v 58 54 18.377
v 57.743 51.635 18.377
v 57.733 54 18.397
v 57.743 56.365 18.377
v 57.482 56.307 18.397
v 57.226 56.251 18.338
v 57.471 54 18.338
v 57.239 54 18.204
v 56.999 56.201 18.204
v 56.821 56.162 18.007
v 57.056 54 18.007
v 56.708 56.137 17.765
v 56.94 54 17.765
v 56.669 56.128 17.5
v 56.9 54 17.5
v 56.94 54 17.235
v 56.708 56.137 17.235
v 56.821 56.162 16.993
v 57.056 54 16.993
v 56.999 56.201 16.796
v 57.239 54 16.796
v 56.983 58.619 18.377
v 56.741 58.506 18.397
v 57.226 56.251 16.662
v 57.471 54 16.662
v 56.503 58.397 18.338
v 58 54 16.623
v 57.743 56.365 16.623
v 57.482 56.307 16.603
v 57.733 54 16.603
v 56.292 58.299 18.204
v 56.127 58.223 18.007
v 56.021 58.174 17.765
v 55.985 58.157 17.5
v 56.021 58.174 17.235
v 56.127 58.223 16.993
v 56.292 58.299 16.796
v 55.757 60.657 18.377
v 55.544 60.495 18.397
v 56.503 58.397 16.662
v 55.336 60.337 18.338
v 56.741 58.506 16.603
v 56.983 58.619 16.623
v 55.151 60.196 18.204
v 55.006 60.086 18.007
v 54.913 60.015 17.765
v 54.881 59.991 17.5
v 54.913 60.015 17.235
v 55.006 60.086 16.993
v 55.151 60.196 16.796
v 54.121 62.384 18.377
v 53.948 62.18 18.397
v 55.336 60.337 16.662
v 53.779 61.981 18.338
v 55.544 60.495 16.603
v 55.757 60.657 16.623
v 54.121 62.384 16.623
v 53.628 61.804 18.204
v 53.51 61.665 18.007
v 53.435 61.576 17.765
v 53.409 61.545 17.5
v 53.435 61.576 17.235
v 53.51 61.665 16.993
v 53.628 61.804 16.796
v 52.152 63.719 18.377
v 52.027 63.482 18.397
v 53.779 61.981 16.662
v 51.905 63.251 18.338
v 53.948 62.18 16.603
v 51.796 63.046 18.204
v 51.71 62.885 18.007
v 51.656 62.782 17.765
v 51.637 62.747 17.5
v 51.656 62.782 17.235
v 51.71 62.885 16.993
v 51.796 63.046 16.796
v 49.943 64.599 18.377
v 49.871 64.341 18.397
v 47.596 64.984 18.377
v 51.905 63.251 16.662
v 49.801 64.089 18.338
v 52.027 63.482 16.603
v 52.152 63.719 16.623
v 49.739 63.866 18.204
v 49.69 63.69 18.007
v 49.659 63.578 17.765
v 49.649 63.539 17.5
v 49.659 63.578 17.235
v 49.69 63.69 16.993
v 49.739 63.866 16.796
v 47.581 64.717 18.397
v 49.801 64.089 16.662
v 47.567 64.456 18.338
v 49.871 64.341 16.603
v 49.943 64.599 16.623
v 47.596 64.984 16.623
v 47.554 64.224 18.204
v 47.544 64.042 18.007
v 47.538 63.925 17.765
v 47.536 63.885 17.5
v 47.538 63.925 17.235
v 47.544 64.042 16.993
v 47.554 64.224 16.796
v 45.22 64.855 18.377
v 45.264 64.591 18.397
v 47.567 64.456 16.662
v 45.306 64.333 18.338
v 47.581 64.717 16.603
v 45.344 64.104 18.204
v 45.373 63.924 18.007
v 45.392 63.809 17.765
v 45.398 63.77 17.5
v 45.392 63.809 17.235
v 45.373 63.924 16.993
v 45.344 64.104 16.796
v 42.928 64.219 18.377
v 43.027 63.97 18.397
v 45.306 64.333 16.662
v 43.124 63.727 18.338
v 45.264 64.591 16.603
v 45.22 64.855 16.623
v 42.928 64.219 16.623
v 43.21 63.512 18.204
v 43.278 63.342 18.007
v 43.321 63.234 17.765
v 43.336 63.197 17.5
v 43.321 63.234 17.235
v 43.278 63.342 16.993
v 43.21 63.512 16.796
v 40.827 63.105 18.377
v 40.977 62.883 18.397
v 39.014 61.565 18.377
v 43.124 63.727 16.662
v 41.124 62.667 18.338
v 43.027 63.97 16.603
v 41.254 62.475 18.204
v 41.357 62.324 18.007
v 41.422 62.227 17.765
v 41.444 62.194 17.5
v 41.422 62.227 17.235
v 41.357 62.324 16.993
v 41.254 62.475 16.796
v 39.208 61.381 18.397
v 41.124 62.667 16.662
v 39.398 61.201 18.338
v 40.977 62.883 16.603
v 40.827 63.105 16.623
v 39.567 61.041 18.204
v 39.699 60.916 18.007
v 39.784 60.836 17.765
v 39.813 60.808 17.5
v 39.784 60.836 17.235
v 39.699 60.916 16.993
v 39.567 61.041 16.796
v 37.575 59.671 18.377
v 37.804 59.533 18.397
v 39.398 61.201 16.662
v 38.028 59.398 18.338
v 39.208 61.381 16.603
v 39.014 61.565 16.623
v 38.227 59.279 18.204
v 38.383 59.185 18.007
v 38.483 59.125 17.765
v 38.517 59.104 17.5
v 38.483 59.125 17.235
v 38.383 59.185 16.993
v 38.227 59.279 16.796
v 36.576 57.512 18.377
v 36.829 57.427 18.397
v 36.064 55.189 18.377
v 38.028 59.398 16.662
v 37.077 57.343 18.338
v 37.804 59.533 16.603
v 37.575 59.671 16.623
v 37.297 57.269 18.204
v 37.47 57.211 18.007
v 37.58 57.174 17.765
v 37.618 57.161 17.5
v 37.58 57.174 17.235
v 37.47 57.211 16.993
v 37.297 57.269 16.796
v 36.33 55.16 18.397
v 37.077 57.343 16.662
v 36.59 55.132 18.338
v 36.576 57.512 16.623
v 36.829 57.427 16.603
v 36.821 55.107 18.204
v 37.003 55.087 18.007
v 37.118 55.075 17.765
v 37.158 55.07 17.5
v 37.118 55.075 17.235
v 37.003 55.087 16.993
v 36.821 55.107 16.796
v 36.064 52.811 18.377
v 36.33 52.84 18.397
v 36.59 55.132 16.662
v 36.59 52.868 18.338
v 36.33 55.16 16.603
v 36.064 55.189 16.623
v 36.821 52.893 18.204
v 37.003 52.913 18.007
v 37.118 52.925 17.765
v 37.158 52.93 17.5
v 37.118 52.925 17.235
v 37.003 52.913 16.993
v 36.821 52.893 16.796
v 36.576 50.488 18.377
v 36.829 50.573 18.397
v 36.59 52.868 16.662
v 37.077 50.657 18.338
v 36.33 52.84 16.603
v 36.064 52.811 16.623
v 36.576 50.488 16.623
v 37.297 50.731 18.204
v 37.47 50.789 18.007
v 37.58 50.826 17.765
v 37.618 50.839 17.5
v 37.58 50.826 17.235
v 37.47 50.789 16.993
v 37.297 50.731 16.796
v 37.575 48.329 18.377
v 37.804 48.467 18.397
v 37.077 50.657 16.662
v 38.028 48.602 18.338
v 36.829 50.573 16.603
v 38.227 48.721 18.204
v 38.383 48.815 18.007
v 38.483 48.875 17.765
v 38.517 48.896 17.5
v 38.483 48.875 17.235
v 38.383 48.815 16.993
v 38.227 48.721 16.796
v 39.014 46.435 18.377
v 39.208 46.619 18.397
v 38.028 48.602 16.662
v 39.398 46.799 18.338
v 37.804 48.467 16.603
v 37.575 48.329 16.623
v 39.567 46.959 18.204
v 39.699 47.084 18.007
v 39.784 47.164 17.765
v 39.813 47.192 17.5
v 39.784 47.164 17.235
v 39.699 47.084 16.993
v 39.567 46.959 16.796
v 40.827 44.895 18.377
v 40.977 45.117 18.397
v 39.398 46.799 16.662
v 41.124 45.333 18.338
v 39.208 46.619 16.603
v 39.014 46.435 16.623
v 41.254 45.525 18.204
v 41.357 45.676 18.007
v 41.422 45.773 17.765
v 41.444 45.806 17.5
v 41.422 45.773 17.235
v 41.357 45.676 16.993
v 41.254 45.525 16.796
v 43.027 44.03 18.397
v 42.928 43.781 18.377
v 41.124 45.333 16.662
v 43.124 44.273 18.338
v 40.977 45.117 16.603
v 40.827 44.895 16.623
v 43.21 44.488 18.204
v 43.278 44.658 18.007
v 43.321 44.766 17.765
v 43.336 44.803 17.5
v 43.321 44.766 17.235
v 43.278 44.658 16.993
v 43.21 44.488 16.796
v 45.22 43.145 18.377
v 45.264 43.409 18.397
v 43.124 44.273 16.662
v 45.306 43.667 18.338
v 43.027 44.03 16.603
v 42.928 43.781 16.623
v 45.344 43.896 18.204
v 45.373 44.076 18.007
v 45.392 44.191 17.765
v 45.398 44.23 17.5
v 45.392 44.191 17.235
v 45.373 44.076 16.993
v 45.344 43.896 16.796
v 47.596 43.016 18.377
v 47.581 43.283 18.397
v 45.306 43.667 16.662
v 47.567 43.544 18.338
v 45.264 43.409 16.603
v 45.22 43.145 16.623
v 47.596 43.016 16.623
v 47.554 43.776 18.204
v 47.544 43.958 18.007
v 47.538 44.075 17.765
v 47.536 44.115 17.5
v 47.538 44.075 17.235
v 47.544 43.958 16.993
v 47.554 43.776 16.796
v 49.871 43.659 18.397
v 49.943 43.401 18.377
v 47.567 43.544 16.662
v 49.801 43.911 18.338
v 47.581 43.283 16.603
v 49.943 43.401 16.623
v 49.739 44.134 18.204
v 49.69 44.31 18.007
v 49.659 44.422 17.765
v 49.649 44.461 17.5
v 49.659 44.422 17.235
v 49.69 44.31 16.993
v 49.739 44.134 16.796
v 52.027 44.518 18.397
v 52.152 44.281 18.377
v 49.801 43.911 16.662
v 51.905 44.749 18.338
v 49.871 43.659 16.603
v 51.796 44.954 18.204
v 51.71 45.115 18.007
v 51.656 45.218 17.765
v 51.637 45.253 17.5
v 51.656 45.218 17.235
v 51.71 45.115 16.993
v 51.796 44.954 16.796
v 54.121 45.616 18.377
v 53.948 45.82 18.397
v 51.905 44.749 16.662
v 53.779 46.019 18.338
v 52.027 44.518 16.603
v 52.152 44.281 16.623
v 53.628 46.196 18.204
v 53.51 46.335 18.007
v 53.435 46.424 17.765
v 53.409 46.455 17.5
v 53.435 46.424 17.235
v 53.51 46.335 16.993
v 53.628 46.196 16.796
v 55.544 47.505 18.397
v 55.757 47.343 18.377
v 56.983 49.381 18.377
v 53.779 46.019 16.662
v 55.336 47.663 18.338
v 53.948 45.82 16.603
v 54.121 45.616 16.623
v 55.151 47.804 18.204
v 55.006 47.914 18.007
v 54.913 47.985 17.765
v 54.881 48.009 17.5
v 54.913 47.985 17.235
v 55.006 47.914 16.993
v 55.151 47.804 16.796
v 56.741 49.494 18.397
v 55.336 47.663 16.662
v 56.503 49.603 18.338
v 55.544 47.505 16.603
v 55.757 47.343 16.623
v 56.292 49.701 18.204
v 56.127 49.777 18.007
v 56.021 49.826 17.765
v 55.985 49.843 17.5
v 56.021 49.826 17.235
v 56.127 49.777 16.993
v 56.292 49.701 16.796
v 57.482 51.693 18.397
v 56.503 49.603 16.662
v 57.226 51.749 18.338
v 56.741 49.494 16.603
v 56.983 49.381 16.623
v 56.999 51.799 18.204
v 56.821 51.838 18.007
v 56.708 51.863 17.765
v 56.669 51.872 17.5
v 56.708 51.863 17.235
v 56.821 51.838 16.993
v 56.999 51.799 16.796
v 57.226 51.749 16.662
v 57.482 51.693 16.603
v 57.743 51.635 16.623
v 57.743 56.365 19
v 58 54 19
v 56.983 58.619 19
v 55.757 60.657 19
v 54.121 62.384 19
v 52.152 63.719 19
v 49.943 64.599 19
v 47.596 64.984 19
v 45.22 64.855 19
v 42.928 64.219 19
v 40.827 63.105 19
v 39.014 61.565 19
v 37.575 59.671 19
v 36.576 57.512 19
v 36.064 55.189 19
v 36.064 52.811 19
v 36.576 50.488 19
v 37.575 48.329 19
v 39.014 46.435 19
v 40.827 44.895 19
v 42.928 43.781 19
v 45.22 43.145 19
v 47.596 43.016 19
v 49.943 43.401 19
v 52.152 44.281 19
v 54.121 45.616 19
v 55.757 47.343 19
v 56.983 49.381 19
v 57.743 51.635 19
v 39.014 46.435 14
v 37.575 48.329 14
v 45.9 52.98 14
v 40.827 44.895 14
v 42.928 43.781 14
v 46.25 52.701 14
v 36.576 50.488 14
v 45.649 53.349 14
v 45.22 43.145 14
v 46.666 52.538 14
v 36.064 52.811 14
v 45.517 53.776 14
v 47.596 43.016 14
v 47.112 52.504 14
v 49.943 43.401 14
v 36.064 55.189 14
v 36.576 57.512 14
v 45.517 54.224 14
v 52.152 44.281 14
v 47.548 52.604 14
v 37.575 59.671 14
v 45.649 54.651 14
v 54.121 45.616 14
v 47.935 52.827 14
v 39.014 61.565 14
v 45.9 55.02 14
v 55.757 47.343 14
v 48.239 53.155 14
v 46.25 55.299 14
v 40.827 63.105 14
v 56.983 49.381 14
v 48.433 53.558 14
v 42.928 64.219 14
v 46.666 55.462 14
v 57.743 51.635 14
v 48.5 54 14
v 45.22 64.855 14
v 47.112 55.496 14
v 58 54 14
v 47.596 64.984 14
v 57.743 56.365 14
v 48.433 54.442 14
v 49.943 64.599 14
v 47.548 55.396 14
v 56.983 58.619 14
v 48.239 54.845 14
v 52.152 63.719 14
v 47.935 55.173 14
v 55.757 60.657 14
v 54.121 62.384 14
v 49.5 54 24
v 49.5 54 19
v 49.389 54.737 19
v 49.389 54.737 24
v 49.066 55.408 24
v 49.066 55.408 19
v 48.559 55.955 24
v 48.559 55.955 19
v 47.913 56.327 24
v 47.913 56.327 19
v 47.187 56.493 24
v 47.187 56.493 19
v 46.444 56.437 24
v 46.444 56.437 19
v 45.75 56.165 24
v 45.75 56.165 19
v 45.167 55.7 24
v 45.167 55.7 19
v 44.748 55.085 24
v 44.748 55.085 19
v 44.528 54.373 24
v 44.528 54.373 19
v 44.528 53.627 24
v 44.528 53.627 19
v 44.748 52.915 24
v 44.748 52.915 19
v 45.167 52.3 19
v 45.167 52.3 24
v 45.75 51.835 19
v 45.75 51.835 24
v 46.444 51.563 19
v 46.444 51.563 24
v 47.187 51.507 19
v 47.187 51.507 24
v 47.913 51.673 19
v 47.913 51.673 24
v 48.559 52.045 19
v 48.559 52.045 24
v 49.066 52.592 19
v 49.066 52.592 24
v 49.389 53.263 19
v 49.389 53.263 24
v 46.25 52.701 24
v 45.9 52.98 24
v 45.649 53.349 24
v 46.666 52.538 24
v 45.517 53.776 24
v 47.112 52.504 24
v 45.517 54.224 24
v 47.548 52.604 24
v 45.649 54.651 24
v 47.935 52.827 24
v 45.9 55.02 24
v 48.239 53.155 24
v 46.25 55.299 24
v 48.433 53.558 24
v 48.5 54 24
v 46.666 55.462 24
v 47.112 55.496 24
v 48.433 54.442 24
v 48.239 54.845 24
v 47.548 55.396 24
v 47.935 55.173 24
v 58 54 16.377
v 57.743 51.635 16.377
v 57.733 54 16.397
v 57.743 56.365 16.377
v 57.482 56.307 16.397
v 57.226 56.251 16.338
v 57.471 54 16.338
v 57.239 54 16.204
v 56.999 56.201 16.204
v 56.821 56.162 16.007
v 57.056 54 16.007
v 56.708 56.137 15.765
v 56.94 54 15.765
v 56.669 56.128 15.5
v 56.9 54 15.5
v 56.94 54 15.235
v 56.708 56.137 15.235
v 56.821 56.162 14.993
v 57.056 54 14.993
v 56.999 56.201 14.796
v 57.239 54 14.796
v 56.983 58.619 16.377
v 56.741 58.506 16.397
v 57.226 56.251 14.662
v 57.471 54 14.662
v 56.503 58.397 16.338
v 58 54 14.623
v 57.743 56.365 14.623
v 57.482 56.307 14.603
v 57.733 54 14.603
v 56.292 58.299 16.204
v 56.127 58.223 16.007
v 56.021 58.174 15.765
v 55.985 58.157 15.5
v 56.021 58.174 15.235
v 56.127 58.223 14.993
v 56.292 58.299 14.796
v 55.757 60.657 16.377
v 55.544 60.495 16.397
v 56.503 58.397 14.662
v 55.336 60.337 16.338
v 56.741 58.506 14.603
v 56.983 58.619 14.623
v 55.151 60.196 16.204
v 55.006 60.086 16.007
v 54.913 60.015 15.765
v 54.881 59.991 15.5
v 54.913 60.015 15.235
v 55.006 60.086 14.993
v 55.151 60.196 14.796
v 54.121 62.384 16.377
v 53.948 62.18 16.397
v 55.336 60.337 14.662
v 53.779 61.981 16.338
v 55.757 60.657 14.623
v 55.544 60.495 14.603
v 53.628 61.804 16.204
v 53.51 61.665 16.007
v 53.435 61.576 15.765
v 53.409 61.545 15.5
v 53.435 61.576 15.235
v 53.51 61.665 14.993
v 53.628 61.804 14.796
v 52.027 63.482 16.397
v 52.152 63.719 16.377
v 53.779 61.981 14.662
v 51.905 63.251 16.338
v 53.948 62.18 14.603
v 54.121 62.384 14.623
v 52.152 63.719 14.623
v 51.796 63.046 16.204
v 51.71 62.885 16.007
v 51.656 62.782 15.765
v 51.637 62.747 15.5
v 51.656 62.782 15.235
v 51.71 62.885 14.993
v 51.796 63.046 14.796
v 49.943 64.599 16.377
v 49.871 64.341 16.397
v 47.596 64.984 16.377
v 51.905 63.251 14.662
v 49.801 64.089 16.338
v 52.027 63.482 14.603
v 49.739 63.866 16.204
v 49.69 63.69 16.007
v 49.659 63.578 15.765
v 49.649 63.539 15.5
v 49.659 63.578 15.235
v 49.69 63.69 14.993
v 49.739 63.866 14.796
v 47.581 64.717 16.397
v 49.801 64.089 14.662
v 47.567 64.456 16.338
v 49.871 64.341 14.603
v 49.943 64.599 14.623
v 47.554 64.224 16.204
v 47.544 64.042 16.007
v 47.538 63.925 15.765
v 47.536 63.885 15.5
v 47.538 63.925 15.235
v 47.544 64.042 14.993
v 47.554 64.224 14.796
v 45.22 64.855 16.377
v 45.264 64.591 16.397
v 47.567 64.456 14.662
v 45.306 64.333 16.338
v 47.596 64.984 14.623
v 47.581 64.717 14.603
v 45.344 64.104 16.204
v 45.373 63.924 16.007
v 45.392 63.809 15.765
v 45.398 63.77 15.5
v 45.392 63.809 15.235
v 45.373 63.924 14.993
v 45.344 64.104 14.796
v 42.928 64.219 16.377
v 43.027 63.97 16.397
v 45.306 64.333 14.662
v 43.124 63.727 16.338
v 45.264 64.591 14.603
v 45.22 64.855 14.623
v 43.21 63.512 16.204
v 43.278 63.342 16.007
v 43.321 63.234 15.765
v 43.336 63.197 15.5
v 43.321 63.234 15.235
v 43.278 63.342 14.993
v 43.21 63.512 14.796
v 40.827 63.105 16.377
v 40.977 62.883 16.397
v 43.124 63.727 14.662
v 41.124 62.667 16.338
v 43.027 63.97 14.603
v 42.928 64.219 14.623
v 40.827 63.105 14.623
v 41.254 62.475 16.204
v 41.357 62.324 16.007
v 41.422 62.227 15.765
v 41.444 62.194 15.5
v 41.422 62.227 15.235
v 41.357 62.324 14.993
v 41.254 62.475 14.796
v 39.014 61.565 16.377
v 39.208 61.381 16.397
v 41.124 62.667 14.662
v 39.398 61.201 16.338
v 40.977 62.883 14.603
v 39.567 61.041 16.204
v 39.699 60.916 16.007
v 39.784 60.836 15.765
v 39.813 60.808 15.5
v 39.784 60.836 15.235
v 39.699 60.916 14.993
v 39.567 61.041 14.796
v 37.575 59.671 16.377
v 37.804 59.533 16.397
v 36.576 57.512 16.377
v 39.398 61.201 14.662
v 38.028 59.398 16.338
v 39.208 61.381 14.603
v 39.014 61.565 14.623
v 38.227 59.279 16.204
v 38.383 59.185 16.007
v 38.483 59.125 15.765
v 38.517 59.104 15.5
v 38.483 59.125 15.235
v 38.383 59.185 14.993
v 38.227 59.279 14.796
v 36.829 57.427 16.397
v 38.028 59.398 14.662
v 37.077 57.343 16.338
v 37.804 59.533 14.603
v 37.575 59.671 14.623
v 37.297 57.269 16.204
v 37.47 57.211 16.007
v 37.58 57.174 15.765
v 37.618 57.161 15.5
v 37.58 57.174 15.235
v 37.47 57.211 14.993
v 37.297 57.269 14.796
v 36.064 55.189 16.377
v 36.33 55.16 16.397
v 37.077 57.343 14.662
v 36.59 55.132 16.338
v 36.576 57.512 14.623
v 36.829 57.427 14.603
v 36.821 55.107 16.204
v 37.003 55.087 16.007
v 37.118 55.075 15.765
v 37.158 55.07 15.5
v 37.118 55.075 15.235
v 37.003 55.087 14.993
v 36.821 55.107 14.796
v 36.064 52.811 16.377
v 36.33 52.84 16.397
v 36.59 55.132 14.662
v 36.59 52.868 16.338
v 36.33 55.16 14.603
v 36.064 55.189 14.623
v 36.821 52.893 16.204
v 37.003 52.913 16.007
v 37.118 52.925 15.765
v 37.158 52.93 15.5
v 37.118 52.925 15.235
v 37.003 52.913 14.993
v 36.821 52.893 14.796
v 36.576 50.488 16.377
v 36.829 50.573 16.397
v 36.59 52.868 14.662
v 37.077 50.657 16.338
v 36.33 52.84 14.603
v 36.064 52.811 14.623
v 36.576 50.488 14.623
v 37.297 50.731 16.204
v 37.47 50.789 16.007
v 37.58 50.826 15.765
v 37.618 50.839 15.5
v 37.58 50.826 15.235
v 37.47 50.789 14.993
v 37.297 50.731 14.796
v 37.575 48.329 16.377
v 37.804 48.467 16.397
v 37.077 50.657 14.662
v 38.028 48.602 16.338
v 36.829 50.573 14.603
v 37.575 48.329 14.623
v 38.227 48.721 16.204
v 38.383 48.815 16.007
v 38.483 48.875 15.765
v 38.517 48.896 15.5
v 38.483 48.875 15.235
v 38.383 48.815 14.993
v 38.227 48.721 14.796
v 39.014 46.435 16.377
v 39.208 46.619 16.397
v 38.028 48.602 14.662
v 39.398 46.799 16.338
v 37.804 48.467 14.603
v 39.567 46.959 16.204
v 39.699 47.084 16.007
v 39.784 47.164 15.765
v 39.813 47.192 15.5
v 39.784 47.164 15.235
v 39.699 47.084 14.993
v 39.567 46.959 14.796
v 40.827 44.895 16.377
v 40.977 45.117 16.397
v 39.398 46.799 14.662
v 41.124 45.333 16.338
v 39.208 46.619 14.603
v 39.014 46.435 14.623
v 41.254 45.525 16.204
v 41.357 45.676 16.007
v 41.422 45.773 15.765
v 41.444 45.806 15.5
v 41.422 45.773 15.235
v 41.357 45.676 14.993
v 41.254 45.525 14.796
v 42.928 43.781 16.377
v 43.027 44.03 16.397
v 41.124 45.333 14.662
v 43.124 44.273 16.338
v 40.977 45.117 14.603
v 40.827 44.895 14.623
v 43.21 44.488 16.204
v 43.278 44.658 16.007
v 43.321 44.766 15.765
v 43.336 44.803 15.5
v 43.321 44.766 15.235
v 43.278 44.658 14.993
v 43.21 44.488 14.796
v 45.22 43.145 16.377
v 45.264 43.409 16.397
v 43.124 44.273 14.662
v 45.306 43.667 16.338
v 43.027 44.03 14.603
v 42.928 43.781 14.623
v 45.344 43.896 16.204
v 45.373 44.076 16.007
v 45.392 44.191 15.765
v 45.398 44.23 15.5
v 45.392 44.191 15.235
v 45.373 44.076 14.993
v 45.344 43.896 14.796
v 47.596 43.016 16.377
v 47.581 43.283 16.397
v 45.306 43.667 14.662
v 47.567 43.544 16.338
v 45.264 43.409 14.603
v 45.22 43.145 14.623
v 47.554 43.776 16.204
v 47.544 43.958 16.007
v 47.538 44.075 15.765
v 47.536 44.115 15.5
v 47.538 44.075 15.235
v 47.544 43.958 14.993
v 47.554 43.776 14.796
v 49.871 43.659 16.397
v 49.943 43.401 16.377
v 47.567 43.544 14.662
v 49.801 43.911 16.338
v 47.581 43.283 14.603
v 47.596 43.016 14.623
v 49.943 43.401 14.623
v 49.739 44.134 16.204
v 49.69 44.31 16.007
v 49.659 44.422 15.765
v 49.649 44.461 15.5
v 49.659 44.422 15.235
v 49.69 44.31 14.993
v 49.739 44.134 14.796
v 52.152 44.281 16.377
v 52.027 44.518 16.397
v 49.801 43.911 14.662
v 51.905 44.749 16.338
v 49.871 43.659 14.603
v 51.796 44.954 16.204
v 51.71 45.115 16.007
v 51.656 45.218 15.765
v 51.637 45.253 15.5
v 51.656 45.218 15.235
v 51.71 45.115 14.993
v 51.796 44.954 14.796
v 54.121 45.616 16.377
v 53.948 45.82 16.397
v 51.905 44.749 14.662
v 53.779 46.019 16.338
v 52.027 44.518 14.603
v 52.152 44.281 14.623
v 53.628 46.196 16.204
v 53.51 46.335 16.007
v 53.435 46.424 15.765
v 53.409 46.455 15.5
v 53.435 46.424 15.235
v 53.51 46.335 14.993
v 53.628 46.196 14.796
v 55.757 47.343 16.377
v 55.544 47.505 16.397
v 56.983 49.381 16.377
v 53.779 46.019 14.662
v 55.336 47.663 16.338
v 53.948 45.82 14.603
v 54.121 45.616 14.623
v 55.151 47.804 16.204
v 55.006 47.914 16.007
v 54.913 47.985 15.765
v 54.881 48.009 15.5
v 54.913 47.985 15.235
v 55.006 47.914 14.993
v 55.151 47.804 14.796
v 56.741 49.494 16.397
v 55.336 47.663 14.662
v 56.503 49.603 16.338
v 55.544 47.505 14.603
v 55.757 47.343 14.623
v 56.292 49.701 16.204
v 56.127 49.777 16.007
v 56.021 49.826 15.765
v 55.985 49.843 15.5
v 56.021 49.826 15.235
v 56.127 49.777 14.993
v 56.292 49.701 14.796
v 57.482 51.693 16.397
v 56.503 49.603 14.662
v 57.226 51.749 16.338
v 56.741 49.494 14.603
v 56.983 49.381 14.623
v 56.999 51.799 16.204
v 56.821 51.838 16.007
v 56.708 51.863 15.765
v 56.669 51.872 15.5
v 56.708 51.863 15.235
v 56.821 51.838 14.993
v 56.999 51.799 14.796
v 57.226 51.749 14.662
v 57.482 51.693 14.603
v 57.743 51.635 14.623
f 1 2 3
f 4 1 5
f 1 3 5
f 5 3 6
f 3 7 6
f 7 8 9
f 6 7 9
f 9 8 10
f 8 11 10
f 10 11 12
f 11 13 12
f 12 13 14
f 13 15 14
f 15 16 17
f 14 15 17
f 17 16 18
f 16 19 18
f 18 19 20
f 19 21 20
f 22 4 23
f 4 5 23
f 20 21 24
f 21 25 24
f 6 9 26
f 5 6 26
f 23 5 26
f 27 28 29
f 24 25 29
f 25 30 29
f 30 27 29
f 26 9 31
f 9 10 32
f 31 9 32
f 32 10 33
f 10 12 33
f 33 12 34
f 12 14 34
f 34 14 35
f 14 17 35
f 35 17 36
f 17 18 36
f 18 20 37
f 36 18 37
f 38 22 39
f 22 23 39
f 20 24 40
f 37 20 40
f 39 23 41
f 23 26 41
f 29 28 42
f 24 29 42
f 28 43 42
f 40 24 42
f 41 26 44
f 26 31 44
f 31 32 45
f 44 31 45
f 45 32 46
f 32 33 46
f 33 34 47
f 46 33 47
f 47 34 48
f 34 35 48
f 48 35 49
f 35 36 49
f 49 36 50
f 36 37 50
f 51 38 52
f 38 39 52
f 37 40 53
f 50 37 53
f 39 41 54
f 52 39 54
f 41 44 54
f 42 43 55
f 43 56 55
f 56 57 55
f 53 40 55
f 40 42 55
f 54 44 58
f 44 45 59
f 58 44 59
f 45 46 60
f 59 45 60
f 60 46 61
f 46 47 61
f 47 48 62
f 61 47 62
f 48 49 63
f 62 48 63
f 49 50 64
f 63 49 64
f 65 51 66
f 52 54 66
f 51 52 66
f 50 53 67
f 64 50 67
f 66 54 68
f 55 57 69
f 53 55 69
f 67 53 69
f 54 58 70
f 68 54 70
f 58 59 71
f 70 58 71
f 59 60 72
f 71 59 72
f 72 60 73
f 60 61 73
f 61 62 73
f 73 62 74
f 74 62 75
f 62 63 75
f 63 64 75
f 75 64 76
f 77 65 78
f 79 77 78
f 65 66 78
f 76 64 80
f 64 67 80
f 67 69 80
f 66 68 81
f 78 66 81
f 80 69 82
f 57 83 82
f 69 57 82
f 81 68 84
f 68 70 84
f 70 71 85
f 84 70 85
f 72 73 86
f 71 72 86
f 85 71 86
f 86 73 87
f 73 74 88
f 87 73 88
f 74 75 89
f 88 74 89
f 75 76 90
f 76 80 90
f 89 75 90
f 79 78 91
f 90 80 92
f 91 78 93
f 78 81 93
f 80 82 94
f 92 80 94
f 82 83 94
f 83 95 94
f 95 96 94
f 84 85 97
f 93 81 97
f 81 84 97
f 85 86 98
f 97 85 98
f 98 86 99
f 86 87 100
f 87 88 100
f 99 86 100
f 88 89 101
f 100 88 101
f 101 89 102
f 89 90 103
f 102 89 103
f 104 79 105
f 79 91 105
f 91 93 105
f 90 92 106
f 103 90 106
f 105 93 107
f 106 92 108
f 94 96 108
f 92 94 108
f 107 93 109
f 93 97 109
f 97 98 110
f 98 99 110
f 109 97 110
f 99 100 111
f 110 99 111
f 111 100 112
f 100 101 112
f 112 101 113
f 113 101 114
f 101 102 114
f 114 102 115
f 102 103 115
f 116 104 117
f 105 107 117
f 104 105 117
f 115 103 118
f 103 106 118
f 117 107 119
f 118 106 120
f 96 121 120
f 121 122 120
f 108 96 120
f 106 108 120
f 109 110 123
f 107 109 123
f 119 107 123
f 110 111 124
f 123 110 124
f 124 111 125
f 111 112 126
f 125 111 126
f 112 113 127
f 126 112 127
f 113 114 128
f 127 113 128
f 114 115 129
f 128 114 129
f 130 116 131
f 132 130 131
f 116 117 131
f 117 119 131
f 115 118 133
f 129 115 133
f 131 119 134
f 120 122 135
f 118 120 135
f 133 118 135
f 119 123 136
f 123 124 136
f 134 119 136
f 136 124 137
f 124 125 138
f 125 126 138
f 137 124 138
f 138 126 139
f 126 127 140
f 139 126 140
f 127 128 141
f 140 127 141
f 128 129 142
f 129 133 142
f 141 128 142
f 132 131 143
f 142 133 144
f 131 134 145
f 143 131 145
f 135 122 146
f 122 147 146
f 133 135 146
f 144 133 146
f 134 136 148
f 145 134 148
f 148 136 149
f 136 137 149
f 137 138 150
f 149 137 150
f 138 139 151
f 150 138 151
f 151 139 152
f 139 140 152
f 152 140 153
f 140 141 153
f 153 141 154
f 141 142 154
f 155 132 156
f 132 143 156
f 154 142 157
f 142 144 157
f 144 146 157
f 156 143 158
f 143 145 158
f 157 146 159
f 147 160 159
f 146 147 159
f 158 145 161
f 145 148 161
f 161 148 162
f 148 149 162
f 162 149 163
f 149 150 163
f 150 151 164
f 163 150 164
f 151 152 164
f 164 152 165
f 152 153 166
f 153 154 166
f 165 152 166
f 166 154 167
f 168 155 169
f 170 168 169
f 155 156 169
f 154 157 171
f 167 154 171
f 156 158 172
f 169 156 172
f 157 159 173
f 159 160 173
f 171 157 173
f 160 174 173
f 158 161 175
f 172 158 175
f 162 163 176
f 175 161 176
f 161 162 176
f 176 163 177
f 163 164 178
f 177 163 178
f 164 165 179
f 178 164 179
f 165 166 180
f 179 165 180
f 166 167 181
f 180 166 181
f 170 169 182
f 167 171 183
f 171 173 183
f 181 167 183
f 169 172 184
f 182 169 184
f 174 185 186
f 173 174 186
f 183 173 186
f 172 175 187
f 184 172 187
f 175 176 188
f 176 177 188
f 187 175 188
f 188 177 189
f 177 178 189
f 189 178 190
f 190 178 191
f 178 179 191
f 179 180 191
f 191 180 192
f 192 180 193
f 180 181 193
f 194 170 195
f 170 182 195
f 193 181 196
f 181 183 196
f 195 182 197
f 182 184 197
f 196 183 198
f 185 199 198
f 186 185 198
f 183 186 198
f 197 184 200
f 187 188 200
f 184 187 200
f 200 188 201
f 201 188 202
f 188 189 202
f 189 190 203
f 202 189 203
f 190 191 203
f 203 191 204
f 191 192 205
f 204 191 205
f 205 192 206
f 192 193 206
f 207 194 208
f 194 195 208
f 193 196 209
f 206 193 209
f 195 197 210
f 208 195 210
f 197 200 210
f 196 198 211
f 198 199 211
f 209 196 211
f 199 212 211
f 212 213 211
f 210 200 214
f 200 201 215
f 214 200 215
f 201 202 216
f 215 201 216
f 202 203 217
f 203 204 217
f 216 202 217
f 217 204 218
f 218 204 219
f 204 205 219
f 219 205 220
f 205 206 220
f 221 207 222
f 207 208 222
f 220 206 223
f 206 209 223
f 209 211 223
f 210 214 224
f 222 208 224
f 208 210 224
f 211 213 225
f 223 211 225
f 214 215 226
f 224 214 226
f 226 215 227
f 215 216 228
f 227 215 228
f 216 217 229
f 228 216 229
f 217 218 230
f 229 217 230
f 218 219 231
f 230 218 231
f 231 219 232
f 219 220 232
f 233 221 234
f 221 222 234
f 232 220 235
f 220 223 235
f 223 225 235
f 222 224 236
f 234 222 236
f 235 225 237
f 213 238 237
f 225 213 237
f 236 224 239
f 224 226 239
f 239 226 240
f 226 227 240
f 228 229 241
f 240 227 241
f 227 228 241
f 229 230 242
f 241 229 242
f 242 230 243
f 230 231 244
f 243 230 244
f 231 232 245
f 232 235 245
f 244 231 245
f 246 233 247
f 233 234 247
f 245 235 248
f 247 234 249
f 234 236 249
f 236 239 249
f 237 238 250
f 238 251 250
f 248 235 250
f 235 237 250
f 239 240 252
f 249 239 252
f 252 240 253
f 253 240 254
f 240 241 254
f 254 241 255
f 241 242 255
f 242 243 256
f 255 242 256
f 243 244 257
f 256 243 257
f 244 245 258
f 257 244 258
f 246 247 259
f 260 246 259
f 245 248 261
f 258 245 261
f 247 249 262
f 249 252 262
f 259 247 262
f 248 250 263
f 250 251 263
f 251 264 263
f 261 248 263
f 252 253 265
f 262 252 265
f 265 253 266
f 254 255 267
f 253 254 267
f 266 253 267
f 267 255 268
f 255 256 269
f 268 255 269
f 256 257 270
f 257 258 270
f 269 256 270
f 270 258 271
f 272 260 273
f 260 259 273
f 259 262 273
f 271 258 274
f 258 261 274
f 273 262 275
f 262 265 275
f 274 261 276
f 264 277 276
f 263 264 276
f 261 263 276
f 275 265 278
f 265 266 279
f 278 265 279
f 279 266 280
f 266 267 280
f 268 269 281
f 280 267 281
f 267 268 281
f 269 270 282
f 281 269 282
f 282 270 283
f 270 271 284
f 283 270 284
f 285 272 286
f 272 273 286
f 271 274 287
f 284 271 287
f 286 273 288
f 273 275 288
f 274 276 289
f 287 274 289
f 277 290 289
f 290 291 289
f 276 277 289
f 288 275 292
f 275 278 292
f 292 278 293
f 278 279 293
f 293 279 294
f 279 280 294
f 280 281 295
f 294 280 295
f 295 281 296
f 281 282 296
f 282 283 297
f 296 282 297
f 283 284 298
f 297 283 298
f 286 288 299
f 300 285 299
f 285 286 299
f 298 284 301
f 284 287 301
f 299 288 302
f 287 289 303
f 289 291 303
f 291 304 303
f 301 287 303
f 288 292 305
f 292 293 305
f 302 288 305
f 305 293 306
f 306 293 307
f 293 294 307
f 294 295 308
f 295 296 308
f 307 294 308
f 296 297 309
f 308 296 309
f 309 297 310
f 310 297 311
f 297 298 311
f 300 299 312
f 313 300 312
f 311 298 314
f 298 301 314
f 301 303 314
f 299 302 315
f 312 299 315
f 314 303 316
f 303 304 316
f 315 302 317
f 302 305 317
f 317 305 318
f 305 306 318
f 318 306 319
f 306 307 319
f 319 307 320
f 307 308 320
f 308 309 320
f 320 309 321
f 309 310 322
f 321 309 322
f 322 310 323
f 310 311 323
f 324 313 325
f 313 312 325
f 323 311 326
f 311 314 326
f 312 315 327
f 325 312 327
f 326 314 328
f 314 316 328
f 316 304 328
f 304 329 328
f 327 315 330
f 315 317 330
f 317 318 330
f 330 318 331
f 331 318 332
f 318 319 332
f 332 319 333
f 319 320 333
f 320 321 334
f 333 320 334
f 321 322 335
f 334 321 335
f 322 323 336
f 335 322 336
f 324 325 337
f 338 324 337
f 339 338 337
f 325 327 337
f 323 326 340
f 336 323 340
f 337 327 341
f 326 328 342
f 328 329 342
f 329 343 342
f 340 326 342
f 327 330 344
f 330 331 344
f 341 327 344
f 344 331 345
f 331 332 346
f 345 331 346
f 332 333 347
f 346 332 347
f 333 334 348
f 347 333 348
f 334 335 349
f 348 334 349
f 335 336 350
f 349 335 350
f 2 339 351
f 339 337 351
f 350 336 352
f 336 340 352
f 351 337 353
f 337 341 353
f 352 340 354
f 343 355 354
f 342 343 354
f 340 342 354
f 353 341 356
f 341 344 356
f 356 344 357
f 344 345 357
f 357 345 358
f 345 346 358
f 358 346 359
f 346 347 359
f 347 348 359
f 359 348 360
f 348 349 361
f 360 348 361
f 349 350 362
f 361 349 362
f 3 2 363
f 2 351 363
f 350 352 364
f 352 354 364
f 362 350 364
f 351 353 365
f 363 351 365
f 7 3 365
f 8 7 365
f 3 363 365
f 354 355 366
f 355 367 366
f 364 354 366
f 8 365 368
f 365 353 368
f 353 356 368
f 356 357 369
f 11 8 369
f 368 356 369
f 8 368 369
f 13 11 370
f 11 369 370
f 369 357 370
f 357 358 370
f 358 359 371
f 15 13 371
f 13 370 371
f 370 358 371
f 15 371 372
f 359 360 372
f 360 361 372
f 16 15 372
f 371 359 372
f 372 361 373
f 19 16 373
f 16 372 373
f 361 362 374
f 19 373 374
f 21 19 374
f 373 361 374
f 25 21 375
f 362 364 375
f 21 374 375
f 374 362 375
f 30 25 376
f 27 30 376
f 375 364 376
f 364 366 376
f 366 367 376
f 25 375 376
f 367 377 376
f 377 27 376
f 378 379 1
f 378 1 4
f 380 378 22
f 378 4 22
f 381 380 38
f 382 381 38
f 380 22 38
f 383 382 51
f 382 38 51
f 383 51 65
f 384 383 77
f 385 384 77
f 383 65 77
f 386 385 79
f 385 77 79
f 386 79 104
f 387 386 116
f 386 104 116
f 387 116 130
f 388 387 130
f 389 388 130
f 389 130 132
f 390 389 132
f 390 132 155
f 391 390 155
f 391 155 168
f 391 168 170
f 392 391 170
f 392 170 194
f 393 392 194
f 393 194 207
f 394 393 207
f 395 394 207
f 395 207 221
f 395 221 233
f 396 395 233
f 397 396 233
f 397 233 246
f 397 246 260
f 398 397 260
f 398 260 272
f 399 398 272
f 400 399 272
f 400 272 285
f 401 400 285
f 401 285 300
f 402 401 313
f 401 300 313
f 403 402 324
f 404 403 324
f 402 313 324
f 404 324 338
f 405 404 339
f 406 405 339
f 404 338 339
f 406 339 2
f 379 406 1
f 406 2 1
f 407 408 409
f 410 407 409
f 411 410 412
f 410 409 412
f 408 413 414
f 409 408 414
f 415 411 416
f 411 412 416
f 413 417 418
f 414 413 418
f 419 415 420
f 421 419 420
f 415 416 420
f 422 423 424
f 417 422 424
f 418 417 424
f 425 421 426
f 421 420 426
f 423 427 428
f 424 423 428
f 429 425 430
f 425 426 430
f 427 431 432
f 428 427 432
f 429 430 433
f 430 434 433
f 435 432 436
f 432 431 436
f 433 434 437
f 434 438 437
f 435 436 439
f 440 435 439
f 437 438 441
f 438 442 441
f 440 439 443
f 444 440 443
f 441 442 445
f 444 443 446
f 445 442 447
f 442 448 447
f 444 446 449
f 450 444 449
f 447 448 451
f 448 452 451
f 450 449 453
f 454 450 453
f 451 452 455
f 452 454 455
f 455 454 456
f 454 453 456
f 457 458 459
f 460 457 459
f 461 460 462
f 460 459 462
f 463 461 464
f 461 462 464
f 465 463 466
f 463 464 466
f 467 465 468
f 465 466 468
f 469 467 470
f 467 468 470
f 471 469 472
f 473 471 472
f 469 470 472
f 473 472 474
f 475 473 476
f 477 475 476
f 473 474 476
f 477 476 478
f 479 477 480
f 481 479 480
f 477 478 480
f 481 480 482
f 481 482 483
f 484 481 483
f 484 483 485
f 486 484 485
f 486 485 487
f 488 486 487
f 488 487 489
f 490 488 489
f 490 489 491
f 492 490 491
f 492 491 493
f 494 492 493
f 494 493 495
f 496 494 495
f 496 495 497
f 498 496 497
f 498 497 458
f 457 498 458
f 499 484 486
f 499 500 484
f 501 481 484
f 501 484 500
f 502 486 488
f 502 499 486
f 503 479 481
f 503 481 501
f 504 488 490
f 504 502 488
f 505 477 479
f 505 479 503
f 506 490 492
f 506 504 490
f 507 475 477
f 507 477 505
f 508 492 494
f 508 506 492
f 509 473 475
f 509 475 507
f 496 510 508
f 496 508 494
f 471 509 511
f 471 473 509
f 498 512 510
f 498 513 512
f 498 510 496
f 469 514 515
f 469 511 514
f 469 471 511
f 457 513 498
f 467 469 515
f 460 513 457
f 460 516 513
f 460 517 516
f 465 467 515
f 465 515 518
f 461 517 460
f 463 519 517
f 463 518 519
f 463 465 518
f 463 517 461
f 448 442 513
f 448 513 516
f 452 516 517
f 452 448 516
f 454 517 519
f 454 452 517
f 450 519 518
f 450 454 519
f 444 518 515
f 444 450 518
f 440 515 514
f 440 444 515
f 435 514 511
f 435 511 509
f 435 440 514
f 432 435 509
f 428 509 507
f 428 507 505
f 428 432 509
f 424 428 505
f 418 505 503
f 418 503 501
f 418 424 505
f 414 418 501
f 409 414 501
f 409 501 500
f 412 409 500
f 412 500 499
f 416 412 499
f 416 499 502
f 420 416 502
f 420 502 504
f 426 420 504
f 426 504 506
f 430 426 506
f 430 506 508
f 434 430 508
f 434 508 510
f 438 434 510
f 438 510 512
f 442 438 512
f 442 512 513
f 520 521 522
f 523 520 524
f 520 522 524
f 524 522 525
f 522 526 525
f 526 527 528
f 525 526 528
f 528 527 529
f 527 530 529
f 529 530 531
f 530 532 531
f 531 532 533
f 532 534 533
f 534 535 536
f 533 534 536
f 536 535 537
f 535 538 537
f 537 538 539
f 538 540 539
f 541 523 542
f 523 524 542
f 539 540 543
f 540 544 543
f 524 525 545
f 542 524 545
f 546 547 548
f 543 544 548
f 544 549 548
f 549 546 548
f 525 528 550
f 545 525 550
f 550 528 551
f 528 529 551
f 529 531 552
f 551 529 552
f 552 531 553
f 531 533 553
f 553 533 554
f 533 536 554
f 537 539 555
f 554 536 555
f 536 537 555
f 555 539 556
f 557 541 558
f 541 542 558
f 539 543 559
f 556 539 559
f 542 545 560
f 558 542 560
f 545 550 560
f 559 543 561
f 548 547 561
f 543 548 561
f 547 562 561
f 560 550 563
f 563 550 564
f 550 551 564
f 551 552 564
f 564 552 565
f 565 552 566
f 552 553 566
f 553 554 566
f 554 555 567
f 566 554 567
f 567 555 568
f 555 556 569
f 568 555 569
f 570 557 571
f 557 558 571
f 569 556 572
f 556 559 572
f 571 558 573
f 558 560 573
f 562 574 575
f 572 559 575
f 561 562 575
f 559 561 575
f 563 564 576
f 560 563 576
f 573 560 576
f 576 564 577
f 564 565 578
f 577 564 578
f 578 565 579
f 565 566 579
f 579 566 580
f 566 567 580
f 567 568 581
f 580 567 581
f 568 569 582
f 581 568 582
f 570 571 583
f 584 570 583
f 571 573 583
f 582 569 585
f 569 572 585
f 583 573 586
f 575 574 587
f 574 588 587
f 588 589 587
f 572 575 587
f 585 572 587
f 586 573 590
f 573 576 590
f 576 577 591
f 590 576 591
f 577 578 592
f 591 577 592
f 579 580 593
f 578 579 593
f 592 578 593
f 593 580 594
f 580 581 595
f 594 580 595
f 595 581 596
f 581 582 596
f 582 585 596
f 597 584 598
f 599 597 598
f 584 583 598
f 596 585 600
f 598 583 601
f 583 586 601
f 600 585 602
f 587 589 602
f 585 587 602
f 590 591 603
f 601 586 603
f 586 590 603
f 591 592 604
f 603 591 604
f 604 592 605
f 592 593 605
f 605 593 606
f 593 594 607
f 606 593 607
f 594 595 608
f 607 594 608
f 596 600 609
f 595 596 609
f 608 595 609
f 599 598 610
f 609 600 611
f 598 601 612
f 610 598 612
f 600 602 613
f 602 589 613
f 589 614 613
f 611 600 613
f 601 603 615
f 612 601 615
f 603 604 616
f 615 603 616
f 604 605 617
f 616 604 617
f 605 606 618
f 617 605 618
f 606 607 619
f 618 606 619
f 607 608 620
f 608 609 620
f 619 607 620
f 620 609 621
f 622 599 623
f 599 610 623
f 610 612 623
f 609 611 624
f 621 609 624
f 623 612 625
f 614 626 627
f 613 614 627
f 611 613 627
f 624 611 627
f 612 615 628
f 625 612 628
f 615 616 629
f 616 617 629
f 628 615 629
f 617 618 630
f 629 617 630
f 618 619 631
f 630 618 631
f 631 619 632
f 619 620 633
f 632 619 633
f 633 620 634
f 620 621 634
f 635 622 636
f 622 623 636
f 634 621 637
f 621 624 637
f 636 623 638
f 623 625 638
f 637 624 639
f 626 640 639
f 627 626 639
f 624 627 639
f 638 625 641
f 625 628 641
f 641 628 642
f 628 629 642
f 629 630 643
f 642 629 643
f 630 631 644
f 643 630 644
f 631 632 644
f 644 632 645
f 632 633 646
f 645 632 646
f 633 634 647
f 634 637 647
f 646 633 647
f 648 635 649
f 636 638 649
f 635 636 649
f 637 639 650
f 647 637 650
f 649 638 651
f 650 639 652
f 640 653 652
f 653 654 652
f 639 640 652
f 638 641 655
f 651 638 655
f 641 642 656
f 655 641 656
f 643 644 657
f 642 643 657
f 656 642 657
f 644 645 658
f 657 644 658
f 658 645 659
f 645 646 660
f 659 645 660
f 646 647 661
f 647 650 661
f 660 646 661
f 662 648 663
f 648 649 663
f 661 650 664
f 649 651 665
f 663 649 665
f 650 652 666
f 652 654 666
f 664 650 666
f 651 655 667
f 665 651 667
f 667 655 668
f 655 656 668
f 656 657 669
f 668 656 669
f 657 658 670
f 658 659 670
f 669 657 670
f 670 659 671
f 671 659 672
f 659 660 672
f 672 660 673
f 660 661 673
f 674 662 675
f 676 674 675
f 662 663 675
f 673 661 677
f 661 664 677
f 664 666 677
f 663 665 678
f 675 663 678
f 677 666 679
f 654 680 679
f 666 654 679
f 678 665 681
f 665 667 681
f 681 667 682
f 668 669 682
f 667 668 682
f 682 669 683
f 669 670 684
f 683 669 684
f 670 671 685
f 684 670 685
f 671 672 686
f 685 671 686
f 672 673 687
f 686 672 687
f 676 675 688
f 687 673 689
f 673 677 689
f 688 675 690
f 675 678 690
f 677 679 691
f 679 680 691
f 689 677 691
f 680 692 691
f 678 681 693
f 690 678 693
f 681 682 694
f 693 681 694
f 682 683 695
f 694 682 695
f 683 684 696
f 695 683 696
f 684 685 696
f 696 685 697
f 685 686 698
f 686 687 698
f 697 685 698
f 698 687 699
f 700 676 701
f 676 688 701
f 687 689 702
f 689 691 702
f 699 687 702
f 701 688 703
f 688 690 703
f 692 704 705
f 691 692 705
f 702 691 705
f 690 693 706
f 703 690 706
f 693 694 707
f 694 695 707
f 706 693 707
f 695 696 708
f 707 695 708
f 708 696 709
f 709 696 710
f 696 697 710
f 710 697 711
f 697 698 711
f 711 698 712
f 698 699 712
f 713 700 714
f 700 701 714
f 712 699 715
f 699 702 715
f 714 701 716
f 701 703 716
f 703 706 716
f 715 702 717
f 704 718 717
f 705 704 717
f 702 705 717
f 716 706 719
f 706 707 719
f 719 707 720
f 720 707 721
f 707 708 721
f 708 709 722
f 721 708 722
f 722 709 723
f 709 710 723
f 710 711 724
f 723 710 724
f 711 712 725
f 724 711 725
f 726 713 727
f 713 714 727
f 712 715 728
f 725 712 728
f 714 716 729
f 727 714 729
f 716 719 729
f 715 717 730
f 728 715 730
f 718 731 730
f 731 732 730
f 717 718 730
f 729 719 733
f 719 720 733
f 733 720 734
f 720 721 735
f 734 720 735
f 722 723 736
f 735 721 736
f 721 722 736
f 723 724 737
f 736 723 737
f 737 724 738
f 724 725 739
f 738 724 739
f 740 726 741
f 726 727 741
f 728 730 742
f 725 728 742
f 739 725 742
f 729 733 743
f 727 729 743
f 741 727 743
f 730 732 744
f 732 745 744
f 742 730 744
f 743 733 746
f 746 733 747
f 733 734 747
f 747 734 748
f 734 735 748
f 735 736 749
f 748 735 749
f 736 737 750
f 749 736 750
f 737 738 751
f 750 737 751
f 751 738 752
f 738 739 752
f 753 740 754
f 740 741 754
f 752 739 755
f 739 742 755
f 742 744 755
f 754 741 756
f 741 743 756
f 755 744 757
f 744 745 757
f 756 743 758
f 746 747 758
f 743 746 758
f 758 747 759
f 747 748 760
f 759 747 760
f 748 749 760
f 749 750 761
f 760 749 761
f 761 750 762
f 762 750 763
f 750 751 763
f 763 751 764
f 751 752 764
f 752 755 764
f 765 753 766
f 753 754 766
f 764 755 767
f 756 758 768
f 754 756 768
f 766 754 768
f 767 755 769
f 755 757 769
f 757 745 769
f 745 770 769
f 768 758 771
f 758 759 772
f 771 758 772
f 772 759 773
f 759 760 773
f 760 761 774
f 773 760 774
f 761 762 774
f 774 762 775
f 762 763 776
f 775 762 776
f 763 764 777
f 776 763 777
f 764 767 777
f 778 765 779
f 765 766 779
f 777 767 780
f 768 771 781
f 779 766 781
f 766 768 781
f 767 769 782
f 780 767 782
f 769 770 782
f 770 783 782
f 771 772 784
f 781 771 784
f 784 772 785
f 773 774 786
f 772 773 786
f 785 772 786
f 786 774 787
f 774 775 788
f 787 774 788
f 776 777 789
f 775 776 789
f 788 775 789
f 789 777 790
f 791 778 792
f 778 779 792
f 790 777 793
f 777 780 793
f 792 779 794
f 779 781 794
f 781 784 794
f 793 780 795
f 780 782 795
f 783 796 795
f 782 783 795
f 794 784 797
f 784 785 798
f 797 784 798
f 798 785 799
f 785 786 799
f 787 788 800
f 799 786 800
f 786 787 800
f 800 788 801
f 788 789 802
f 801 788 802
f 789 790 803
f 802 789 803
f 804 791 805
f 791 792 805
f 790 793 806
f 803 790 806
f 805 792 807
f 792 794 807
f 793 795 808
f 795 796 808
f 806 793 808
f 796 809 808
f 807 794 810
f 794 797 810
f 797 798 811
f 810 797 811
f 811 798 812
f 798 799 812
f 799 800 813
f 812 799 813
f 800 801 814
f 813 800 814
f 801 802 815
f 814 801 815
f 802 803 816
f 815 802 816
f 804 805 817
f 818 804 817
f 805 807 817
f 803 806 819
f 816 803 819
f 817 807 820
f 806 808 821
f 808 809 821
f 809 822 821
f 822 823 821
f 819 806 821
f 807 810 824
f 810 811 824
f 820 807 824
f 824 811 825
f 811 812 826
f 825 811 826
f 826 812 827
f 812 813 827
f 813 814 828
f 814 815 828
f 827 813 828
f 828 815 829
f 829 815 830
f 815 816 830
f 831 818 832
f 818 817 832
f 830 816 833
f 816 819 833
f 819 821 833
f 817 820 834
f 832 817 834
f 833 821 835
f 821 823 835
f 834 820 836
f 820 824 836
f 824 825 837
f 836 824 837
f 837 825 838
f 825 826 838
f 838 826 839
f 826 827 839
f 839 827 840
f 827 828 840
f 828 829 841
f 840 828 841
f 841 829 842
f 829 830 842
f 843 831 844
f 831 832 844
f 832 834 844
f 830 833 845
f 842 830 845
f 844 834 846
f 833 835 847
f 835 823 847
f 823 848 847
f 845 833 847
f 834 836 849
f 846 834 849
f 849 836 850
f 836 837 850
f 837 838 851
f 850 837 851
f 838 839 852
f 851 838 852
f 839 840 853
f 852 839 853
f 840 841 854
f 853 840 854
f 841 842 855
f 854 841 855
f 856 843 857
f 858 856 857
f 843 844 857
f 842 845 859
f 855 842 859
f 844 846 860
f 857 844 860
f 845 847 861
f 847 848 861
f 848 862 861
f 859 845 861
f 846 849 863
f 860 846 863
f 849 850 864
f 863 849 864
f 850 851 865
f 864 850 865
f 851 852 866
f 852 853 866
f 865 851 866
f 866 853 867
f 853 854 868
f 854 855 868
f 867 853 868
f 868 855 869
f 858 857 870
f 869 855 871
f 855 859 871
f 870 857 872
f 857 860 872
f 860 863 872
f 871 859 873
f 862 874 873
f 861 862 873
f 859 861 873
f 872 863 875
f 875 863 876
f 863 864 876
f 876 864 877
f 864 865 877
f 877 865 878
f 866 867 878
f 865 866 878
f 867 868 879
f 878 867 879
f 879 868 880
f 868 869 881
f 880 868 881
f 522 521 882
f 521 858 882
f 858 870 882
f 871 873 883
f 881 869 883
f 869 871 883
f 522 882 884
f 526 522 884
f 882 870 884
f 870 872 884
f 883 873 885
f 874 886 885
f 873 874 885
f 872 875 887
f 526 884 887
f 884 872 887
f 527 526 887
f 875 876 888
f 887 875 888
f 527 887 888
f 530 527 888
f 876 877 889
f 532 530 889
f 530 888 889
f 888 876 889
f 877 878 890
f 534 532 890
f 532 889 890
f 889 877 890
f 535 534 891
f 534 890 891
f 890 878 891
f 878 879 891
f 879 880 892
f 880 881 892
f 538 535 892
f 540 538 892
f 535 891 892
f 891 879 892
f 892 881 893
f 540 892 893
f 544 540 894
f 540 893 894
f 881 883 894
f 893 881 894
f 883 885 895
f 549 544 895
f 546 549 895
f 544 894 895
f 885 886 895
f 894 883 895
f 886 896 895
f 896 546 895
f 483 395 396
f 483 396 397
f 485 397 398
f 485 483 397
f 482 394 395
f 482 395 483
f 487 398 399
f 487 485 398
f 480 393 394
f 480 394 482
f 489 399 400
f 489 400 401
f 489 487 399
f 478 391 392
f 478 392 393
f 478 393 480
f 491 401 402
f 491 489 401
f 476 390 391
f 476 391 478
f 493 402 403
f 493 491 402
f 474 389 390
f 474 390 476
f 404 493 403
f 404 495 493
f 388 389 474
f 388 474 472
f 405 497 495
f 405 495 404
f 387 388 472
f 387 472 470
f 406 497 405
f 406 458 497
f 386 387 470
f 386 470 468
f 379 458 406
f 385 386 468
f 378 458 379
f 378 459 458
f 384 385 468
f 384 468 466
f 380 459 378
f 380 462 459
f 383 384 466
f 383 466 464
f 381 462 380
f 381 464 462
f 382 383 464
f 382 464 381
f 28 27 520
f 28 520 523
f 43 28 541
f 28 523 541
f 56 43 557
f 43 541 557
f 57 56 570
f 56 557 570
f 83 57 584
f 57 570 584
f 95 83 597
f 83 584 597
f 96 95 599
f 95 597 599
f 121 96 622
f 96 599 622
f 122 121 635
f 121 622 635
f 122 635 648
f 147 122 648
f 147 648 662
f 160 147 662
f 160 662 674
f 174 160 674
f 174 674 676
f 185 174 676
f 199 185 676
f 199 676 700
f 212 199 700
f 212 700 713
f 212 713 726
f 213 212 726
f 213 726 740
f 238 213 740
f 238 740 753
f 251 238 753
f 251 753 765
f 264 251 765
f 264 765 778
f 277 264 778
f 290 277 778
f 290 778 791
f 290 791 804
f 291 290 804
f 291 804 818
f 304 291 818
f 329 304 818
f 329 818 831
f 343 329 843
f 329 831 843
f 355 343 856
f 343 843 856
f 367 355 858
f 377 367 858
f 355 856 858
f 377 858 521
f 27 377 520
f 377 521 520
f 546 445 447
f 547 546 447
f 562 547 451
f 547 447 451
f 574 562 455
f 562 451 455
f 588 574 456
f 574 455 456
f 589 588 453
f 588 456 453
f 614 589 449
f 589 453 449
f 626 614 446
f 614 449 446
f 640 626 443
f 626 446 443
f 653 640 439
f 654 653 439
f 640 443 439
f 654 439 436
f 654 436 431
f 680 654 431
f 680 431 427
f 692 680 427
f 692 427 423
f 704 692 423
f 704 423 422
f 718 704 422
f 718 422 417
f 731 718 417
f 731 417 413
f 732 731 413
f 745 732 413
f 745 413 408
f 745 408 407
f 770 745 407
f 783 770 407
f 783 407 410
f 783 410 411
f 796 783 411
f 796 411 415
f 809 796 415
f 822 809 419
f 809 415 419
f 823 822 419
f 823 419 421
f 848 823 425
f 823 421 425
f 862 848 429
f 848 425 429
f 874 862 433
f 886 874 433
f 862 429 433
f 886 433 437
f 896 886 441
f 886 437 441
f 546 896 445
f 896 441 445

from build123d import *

# Parameters (mm, degrees)
CYLINDER020_R     = 1.5
CYLINDER020_DEPTH = 22
TORUS003_R        = 0.9
TORUS002_R        = 0.9
CYLINDER018_R     = 11
CYLINDER018_DEPTH = 5
CYLINDER017_R     = 1.5
CYLINDER017_DEPTH = 10
CYLINDER019_R     = 2.5
CYLINDER019_DEPTH = 10


with BuildPart() as cylinder020:
    # Cylinder020 → Cylinder020 (new body)
    with BuildSketch(Plane.XY.offset(-4)):
        Circle(CYLINDER020_R)
    extrude(amount=CYLINDER020_DEPTH)


with BuildPart() as torus003:
    # Torus003 → Torus003 (revolve)
    with BuildSketch(Plane(origin=(0, 0, -0.5), x_dir=(1, 0, 0), z_dir=(0, -1, 0))):
        with Locations((10.8, 0)):
            Circle(TORUS003_R)
    revolve(axis=Axis((0, 0, -0.5), (0, 0, 1)))


with BuildPart() as torus002:
    # Torus002 → Torus002 (revolve)
    with BuildSketch(Plane(origin=(0, 0, 1.5), x_dir=(1, 0, 0), z_dir=(0, -1, 0))):
        with Locations((10.8, 0)):
            Circle(TORUS002_R)
    revolve(axis=Axis((0, 0, 1.5), (0, 0, 1)))


with BuildPart() as cylinder018:
    # Cylinder018 → Cylinder018 (new body)
    with BuildSketch(Plane.XY.offset(-2)):
        Circle(CYLINDER018_R)
    extrude(amount=CYLINDER018_DEPTH)


with BuildPart() as cylinder017:
    # Cylinder017 → Cylinder017 (new body)
    with BuildSketch(Plane.XY.offset(-2)):
        Circle(CYLINDER017_R)
    extrude(amount=CYLINDER017_DEPTH)


with BuildPart() as cut013:
    # Cylinder019 → Cylinder019 (new body)
    with BuildSketch(Plane.XY.offset(-2)):
        Circle(CYLINDER019_R)
    extrude(amount=CYLINDER019_DEPTH)

    # Cut010: cut Cylinder017
    add(cylinder017.part, mode=Mode.SUBTRACT)

    # Fusion012: union Cylinder018
    add(cylinder018.part)

    # Cut011: cut Torus002
    add(torus002.part, mode=Mode.SUBTRACT)

    # Cut012: cut Torus003
    add(torus003.part, mode=Mode.SUBTRACT)

    # Cut013: cut Cylinder020
    add(cylinder020.part, mode=Mode.SUBTRACT)


with BuildPart() as cut013_1:
    # Cut013 placement: moved
    add(cut013.part.moved(Location((47, 54, 16))))


solid = cut013_1.part
